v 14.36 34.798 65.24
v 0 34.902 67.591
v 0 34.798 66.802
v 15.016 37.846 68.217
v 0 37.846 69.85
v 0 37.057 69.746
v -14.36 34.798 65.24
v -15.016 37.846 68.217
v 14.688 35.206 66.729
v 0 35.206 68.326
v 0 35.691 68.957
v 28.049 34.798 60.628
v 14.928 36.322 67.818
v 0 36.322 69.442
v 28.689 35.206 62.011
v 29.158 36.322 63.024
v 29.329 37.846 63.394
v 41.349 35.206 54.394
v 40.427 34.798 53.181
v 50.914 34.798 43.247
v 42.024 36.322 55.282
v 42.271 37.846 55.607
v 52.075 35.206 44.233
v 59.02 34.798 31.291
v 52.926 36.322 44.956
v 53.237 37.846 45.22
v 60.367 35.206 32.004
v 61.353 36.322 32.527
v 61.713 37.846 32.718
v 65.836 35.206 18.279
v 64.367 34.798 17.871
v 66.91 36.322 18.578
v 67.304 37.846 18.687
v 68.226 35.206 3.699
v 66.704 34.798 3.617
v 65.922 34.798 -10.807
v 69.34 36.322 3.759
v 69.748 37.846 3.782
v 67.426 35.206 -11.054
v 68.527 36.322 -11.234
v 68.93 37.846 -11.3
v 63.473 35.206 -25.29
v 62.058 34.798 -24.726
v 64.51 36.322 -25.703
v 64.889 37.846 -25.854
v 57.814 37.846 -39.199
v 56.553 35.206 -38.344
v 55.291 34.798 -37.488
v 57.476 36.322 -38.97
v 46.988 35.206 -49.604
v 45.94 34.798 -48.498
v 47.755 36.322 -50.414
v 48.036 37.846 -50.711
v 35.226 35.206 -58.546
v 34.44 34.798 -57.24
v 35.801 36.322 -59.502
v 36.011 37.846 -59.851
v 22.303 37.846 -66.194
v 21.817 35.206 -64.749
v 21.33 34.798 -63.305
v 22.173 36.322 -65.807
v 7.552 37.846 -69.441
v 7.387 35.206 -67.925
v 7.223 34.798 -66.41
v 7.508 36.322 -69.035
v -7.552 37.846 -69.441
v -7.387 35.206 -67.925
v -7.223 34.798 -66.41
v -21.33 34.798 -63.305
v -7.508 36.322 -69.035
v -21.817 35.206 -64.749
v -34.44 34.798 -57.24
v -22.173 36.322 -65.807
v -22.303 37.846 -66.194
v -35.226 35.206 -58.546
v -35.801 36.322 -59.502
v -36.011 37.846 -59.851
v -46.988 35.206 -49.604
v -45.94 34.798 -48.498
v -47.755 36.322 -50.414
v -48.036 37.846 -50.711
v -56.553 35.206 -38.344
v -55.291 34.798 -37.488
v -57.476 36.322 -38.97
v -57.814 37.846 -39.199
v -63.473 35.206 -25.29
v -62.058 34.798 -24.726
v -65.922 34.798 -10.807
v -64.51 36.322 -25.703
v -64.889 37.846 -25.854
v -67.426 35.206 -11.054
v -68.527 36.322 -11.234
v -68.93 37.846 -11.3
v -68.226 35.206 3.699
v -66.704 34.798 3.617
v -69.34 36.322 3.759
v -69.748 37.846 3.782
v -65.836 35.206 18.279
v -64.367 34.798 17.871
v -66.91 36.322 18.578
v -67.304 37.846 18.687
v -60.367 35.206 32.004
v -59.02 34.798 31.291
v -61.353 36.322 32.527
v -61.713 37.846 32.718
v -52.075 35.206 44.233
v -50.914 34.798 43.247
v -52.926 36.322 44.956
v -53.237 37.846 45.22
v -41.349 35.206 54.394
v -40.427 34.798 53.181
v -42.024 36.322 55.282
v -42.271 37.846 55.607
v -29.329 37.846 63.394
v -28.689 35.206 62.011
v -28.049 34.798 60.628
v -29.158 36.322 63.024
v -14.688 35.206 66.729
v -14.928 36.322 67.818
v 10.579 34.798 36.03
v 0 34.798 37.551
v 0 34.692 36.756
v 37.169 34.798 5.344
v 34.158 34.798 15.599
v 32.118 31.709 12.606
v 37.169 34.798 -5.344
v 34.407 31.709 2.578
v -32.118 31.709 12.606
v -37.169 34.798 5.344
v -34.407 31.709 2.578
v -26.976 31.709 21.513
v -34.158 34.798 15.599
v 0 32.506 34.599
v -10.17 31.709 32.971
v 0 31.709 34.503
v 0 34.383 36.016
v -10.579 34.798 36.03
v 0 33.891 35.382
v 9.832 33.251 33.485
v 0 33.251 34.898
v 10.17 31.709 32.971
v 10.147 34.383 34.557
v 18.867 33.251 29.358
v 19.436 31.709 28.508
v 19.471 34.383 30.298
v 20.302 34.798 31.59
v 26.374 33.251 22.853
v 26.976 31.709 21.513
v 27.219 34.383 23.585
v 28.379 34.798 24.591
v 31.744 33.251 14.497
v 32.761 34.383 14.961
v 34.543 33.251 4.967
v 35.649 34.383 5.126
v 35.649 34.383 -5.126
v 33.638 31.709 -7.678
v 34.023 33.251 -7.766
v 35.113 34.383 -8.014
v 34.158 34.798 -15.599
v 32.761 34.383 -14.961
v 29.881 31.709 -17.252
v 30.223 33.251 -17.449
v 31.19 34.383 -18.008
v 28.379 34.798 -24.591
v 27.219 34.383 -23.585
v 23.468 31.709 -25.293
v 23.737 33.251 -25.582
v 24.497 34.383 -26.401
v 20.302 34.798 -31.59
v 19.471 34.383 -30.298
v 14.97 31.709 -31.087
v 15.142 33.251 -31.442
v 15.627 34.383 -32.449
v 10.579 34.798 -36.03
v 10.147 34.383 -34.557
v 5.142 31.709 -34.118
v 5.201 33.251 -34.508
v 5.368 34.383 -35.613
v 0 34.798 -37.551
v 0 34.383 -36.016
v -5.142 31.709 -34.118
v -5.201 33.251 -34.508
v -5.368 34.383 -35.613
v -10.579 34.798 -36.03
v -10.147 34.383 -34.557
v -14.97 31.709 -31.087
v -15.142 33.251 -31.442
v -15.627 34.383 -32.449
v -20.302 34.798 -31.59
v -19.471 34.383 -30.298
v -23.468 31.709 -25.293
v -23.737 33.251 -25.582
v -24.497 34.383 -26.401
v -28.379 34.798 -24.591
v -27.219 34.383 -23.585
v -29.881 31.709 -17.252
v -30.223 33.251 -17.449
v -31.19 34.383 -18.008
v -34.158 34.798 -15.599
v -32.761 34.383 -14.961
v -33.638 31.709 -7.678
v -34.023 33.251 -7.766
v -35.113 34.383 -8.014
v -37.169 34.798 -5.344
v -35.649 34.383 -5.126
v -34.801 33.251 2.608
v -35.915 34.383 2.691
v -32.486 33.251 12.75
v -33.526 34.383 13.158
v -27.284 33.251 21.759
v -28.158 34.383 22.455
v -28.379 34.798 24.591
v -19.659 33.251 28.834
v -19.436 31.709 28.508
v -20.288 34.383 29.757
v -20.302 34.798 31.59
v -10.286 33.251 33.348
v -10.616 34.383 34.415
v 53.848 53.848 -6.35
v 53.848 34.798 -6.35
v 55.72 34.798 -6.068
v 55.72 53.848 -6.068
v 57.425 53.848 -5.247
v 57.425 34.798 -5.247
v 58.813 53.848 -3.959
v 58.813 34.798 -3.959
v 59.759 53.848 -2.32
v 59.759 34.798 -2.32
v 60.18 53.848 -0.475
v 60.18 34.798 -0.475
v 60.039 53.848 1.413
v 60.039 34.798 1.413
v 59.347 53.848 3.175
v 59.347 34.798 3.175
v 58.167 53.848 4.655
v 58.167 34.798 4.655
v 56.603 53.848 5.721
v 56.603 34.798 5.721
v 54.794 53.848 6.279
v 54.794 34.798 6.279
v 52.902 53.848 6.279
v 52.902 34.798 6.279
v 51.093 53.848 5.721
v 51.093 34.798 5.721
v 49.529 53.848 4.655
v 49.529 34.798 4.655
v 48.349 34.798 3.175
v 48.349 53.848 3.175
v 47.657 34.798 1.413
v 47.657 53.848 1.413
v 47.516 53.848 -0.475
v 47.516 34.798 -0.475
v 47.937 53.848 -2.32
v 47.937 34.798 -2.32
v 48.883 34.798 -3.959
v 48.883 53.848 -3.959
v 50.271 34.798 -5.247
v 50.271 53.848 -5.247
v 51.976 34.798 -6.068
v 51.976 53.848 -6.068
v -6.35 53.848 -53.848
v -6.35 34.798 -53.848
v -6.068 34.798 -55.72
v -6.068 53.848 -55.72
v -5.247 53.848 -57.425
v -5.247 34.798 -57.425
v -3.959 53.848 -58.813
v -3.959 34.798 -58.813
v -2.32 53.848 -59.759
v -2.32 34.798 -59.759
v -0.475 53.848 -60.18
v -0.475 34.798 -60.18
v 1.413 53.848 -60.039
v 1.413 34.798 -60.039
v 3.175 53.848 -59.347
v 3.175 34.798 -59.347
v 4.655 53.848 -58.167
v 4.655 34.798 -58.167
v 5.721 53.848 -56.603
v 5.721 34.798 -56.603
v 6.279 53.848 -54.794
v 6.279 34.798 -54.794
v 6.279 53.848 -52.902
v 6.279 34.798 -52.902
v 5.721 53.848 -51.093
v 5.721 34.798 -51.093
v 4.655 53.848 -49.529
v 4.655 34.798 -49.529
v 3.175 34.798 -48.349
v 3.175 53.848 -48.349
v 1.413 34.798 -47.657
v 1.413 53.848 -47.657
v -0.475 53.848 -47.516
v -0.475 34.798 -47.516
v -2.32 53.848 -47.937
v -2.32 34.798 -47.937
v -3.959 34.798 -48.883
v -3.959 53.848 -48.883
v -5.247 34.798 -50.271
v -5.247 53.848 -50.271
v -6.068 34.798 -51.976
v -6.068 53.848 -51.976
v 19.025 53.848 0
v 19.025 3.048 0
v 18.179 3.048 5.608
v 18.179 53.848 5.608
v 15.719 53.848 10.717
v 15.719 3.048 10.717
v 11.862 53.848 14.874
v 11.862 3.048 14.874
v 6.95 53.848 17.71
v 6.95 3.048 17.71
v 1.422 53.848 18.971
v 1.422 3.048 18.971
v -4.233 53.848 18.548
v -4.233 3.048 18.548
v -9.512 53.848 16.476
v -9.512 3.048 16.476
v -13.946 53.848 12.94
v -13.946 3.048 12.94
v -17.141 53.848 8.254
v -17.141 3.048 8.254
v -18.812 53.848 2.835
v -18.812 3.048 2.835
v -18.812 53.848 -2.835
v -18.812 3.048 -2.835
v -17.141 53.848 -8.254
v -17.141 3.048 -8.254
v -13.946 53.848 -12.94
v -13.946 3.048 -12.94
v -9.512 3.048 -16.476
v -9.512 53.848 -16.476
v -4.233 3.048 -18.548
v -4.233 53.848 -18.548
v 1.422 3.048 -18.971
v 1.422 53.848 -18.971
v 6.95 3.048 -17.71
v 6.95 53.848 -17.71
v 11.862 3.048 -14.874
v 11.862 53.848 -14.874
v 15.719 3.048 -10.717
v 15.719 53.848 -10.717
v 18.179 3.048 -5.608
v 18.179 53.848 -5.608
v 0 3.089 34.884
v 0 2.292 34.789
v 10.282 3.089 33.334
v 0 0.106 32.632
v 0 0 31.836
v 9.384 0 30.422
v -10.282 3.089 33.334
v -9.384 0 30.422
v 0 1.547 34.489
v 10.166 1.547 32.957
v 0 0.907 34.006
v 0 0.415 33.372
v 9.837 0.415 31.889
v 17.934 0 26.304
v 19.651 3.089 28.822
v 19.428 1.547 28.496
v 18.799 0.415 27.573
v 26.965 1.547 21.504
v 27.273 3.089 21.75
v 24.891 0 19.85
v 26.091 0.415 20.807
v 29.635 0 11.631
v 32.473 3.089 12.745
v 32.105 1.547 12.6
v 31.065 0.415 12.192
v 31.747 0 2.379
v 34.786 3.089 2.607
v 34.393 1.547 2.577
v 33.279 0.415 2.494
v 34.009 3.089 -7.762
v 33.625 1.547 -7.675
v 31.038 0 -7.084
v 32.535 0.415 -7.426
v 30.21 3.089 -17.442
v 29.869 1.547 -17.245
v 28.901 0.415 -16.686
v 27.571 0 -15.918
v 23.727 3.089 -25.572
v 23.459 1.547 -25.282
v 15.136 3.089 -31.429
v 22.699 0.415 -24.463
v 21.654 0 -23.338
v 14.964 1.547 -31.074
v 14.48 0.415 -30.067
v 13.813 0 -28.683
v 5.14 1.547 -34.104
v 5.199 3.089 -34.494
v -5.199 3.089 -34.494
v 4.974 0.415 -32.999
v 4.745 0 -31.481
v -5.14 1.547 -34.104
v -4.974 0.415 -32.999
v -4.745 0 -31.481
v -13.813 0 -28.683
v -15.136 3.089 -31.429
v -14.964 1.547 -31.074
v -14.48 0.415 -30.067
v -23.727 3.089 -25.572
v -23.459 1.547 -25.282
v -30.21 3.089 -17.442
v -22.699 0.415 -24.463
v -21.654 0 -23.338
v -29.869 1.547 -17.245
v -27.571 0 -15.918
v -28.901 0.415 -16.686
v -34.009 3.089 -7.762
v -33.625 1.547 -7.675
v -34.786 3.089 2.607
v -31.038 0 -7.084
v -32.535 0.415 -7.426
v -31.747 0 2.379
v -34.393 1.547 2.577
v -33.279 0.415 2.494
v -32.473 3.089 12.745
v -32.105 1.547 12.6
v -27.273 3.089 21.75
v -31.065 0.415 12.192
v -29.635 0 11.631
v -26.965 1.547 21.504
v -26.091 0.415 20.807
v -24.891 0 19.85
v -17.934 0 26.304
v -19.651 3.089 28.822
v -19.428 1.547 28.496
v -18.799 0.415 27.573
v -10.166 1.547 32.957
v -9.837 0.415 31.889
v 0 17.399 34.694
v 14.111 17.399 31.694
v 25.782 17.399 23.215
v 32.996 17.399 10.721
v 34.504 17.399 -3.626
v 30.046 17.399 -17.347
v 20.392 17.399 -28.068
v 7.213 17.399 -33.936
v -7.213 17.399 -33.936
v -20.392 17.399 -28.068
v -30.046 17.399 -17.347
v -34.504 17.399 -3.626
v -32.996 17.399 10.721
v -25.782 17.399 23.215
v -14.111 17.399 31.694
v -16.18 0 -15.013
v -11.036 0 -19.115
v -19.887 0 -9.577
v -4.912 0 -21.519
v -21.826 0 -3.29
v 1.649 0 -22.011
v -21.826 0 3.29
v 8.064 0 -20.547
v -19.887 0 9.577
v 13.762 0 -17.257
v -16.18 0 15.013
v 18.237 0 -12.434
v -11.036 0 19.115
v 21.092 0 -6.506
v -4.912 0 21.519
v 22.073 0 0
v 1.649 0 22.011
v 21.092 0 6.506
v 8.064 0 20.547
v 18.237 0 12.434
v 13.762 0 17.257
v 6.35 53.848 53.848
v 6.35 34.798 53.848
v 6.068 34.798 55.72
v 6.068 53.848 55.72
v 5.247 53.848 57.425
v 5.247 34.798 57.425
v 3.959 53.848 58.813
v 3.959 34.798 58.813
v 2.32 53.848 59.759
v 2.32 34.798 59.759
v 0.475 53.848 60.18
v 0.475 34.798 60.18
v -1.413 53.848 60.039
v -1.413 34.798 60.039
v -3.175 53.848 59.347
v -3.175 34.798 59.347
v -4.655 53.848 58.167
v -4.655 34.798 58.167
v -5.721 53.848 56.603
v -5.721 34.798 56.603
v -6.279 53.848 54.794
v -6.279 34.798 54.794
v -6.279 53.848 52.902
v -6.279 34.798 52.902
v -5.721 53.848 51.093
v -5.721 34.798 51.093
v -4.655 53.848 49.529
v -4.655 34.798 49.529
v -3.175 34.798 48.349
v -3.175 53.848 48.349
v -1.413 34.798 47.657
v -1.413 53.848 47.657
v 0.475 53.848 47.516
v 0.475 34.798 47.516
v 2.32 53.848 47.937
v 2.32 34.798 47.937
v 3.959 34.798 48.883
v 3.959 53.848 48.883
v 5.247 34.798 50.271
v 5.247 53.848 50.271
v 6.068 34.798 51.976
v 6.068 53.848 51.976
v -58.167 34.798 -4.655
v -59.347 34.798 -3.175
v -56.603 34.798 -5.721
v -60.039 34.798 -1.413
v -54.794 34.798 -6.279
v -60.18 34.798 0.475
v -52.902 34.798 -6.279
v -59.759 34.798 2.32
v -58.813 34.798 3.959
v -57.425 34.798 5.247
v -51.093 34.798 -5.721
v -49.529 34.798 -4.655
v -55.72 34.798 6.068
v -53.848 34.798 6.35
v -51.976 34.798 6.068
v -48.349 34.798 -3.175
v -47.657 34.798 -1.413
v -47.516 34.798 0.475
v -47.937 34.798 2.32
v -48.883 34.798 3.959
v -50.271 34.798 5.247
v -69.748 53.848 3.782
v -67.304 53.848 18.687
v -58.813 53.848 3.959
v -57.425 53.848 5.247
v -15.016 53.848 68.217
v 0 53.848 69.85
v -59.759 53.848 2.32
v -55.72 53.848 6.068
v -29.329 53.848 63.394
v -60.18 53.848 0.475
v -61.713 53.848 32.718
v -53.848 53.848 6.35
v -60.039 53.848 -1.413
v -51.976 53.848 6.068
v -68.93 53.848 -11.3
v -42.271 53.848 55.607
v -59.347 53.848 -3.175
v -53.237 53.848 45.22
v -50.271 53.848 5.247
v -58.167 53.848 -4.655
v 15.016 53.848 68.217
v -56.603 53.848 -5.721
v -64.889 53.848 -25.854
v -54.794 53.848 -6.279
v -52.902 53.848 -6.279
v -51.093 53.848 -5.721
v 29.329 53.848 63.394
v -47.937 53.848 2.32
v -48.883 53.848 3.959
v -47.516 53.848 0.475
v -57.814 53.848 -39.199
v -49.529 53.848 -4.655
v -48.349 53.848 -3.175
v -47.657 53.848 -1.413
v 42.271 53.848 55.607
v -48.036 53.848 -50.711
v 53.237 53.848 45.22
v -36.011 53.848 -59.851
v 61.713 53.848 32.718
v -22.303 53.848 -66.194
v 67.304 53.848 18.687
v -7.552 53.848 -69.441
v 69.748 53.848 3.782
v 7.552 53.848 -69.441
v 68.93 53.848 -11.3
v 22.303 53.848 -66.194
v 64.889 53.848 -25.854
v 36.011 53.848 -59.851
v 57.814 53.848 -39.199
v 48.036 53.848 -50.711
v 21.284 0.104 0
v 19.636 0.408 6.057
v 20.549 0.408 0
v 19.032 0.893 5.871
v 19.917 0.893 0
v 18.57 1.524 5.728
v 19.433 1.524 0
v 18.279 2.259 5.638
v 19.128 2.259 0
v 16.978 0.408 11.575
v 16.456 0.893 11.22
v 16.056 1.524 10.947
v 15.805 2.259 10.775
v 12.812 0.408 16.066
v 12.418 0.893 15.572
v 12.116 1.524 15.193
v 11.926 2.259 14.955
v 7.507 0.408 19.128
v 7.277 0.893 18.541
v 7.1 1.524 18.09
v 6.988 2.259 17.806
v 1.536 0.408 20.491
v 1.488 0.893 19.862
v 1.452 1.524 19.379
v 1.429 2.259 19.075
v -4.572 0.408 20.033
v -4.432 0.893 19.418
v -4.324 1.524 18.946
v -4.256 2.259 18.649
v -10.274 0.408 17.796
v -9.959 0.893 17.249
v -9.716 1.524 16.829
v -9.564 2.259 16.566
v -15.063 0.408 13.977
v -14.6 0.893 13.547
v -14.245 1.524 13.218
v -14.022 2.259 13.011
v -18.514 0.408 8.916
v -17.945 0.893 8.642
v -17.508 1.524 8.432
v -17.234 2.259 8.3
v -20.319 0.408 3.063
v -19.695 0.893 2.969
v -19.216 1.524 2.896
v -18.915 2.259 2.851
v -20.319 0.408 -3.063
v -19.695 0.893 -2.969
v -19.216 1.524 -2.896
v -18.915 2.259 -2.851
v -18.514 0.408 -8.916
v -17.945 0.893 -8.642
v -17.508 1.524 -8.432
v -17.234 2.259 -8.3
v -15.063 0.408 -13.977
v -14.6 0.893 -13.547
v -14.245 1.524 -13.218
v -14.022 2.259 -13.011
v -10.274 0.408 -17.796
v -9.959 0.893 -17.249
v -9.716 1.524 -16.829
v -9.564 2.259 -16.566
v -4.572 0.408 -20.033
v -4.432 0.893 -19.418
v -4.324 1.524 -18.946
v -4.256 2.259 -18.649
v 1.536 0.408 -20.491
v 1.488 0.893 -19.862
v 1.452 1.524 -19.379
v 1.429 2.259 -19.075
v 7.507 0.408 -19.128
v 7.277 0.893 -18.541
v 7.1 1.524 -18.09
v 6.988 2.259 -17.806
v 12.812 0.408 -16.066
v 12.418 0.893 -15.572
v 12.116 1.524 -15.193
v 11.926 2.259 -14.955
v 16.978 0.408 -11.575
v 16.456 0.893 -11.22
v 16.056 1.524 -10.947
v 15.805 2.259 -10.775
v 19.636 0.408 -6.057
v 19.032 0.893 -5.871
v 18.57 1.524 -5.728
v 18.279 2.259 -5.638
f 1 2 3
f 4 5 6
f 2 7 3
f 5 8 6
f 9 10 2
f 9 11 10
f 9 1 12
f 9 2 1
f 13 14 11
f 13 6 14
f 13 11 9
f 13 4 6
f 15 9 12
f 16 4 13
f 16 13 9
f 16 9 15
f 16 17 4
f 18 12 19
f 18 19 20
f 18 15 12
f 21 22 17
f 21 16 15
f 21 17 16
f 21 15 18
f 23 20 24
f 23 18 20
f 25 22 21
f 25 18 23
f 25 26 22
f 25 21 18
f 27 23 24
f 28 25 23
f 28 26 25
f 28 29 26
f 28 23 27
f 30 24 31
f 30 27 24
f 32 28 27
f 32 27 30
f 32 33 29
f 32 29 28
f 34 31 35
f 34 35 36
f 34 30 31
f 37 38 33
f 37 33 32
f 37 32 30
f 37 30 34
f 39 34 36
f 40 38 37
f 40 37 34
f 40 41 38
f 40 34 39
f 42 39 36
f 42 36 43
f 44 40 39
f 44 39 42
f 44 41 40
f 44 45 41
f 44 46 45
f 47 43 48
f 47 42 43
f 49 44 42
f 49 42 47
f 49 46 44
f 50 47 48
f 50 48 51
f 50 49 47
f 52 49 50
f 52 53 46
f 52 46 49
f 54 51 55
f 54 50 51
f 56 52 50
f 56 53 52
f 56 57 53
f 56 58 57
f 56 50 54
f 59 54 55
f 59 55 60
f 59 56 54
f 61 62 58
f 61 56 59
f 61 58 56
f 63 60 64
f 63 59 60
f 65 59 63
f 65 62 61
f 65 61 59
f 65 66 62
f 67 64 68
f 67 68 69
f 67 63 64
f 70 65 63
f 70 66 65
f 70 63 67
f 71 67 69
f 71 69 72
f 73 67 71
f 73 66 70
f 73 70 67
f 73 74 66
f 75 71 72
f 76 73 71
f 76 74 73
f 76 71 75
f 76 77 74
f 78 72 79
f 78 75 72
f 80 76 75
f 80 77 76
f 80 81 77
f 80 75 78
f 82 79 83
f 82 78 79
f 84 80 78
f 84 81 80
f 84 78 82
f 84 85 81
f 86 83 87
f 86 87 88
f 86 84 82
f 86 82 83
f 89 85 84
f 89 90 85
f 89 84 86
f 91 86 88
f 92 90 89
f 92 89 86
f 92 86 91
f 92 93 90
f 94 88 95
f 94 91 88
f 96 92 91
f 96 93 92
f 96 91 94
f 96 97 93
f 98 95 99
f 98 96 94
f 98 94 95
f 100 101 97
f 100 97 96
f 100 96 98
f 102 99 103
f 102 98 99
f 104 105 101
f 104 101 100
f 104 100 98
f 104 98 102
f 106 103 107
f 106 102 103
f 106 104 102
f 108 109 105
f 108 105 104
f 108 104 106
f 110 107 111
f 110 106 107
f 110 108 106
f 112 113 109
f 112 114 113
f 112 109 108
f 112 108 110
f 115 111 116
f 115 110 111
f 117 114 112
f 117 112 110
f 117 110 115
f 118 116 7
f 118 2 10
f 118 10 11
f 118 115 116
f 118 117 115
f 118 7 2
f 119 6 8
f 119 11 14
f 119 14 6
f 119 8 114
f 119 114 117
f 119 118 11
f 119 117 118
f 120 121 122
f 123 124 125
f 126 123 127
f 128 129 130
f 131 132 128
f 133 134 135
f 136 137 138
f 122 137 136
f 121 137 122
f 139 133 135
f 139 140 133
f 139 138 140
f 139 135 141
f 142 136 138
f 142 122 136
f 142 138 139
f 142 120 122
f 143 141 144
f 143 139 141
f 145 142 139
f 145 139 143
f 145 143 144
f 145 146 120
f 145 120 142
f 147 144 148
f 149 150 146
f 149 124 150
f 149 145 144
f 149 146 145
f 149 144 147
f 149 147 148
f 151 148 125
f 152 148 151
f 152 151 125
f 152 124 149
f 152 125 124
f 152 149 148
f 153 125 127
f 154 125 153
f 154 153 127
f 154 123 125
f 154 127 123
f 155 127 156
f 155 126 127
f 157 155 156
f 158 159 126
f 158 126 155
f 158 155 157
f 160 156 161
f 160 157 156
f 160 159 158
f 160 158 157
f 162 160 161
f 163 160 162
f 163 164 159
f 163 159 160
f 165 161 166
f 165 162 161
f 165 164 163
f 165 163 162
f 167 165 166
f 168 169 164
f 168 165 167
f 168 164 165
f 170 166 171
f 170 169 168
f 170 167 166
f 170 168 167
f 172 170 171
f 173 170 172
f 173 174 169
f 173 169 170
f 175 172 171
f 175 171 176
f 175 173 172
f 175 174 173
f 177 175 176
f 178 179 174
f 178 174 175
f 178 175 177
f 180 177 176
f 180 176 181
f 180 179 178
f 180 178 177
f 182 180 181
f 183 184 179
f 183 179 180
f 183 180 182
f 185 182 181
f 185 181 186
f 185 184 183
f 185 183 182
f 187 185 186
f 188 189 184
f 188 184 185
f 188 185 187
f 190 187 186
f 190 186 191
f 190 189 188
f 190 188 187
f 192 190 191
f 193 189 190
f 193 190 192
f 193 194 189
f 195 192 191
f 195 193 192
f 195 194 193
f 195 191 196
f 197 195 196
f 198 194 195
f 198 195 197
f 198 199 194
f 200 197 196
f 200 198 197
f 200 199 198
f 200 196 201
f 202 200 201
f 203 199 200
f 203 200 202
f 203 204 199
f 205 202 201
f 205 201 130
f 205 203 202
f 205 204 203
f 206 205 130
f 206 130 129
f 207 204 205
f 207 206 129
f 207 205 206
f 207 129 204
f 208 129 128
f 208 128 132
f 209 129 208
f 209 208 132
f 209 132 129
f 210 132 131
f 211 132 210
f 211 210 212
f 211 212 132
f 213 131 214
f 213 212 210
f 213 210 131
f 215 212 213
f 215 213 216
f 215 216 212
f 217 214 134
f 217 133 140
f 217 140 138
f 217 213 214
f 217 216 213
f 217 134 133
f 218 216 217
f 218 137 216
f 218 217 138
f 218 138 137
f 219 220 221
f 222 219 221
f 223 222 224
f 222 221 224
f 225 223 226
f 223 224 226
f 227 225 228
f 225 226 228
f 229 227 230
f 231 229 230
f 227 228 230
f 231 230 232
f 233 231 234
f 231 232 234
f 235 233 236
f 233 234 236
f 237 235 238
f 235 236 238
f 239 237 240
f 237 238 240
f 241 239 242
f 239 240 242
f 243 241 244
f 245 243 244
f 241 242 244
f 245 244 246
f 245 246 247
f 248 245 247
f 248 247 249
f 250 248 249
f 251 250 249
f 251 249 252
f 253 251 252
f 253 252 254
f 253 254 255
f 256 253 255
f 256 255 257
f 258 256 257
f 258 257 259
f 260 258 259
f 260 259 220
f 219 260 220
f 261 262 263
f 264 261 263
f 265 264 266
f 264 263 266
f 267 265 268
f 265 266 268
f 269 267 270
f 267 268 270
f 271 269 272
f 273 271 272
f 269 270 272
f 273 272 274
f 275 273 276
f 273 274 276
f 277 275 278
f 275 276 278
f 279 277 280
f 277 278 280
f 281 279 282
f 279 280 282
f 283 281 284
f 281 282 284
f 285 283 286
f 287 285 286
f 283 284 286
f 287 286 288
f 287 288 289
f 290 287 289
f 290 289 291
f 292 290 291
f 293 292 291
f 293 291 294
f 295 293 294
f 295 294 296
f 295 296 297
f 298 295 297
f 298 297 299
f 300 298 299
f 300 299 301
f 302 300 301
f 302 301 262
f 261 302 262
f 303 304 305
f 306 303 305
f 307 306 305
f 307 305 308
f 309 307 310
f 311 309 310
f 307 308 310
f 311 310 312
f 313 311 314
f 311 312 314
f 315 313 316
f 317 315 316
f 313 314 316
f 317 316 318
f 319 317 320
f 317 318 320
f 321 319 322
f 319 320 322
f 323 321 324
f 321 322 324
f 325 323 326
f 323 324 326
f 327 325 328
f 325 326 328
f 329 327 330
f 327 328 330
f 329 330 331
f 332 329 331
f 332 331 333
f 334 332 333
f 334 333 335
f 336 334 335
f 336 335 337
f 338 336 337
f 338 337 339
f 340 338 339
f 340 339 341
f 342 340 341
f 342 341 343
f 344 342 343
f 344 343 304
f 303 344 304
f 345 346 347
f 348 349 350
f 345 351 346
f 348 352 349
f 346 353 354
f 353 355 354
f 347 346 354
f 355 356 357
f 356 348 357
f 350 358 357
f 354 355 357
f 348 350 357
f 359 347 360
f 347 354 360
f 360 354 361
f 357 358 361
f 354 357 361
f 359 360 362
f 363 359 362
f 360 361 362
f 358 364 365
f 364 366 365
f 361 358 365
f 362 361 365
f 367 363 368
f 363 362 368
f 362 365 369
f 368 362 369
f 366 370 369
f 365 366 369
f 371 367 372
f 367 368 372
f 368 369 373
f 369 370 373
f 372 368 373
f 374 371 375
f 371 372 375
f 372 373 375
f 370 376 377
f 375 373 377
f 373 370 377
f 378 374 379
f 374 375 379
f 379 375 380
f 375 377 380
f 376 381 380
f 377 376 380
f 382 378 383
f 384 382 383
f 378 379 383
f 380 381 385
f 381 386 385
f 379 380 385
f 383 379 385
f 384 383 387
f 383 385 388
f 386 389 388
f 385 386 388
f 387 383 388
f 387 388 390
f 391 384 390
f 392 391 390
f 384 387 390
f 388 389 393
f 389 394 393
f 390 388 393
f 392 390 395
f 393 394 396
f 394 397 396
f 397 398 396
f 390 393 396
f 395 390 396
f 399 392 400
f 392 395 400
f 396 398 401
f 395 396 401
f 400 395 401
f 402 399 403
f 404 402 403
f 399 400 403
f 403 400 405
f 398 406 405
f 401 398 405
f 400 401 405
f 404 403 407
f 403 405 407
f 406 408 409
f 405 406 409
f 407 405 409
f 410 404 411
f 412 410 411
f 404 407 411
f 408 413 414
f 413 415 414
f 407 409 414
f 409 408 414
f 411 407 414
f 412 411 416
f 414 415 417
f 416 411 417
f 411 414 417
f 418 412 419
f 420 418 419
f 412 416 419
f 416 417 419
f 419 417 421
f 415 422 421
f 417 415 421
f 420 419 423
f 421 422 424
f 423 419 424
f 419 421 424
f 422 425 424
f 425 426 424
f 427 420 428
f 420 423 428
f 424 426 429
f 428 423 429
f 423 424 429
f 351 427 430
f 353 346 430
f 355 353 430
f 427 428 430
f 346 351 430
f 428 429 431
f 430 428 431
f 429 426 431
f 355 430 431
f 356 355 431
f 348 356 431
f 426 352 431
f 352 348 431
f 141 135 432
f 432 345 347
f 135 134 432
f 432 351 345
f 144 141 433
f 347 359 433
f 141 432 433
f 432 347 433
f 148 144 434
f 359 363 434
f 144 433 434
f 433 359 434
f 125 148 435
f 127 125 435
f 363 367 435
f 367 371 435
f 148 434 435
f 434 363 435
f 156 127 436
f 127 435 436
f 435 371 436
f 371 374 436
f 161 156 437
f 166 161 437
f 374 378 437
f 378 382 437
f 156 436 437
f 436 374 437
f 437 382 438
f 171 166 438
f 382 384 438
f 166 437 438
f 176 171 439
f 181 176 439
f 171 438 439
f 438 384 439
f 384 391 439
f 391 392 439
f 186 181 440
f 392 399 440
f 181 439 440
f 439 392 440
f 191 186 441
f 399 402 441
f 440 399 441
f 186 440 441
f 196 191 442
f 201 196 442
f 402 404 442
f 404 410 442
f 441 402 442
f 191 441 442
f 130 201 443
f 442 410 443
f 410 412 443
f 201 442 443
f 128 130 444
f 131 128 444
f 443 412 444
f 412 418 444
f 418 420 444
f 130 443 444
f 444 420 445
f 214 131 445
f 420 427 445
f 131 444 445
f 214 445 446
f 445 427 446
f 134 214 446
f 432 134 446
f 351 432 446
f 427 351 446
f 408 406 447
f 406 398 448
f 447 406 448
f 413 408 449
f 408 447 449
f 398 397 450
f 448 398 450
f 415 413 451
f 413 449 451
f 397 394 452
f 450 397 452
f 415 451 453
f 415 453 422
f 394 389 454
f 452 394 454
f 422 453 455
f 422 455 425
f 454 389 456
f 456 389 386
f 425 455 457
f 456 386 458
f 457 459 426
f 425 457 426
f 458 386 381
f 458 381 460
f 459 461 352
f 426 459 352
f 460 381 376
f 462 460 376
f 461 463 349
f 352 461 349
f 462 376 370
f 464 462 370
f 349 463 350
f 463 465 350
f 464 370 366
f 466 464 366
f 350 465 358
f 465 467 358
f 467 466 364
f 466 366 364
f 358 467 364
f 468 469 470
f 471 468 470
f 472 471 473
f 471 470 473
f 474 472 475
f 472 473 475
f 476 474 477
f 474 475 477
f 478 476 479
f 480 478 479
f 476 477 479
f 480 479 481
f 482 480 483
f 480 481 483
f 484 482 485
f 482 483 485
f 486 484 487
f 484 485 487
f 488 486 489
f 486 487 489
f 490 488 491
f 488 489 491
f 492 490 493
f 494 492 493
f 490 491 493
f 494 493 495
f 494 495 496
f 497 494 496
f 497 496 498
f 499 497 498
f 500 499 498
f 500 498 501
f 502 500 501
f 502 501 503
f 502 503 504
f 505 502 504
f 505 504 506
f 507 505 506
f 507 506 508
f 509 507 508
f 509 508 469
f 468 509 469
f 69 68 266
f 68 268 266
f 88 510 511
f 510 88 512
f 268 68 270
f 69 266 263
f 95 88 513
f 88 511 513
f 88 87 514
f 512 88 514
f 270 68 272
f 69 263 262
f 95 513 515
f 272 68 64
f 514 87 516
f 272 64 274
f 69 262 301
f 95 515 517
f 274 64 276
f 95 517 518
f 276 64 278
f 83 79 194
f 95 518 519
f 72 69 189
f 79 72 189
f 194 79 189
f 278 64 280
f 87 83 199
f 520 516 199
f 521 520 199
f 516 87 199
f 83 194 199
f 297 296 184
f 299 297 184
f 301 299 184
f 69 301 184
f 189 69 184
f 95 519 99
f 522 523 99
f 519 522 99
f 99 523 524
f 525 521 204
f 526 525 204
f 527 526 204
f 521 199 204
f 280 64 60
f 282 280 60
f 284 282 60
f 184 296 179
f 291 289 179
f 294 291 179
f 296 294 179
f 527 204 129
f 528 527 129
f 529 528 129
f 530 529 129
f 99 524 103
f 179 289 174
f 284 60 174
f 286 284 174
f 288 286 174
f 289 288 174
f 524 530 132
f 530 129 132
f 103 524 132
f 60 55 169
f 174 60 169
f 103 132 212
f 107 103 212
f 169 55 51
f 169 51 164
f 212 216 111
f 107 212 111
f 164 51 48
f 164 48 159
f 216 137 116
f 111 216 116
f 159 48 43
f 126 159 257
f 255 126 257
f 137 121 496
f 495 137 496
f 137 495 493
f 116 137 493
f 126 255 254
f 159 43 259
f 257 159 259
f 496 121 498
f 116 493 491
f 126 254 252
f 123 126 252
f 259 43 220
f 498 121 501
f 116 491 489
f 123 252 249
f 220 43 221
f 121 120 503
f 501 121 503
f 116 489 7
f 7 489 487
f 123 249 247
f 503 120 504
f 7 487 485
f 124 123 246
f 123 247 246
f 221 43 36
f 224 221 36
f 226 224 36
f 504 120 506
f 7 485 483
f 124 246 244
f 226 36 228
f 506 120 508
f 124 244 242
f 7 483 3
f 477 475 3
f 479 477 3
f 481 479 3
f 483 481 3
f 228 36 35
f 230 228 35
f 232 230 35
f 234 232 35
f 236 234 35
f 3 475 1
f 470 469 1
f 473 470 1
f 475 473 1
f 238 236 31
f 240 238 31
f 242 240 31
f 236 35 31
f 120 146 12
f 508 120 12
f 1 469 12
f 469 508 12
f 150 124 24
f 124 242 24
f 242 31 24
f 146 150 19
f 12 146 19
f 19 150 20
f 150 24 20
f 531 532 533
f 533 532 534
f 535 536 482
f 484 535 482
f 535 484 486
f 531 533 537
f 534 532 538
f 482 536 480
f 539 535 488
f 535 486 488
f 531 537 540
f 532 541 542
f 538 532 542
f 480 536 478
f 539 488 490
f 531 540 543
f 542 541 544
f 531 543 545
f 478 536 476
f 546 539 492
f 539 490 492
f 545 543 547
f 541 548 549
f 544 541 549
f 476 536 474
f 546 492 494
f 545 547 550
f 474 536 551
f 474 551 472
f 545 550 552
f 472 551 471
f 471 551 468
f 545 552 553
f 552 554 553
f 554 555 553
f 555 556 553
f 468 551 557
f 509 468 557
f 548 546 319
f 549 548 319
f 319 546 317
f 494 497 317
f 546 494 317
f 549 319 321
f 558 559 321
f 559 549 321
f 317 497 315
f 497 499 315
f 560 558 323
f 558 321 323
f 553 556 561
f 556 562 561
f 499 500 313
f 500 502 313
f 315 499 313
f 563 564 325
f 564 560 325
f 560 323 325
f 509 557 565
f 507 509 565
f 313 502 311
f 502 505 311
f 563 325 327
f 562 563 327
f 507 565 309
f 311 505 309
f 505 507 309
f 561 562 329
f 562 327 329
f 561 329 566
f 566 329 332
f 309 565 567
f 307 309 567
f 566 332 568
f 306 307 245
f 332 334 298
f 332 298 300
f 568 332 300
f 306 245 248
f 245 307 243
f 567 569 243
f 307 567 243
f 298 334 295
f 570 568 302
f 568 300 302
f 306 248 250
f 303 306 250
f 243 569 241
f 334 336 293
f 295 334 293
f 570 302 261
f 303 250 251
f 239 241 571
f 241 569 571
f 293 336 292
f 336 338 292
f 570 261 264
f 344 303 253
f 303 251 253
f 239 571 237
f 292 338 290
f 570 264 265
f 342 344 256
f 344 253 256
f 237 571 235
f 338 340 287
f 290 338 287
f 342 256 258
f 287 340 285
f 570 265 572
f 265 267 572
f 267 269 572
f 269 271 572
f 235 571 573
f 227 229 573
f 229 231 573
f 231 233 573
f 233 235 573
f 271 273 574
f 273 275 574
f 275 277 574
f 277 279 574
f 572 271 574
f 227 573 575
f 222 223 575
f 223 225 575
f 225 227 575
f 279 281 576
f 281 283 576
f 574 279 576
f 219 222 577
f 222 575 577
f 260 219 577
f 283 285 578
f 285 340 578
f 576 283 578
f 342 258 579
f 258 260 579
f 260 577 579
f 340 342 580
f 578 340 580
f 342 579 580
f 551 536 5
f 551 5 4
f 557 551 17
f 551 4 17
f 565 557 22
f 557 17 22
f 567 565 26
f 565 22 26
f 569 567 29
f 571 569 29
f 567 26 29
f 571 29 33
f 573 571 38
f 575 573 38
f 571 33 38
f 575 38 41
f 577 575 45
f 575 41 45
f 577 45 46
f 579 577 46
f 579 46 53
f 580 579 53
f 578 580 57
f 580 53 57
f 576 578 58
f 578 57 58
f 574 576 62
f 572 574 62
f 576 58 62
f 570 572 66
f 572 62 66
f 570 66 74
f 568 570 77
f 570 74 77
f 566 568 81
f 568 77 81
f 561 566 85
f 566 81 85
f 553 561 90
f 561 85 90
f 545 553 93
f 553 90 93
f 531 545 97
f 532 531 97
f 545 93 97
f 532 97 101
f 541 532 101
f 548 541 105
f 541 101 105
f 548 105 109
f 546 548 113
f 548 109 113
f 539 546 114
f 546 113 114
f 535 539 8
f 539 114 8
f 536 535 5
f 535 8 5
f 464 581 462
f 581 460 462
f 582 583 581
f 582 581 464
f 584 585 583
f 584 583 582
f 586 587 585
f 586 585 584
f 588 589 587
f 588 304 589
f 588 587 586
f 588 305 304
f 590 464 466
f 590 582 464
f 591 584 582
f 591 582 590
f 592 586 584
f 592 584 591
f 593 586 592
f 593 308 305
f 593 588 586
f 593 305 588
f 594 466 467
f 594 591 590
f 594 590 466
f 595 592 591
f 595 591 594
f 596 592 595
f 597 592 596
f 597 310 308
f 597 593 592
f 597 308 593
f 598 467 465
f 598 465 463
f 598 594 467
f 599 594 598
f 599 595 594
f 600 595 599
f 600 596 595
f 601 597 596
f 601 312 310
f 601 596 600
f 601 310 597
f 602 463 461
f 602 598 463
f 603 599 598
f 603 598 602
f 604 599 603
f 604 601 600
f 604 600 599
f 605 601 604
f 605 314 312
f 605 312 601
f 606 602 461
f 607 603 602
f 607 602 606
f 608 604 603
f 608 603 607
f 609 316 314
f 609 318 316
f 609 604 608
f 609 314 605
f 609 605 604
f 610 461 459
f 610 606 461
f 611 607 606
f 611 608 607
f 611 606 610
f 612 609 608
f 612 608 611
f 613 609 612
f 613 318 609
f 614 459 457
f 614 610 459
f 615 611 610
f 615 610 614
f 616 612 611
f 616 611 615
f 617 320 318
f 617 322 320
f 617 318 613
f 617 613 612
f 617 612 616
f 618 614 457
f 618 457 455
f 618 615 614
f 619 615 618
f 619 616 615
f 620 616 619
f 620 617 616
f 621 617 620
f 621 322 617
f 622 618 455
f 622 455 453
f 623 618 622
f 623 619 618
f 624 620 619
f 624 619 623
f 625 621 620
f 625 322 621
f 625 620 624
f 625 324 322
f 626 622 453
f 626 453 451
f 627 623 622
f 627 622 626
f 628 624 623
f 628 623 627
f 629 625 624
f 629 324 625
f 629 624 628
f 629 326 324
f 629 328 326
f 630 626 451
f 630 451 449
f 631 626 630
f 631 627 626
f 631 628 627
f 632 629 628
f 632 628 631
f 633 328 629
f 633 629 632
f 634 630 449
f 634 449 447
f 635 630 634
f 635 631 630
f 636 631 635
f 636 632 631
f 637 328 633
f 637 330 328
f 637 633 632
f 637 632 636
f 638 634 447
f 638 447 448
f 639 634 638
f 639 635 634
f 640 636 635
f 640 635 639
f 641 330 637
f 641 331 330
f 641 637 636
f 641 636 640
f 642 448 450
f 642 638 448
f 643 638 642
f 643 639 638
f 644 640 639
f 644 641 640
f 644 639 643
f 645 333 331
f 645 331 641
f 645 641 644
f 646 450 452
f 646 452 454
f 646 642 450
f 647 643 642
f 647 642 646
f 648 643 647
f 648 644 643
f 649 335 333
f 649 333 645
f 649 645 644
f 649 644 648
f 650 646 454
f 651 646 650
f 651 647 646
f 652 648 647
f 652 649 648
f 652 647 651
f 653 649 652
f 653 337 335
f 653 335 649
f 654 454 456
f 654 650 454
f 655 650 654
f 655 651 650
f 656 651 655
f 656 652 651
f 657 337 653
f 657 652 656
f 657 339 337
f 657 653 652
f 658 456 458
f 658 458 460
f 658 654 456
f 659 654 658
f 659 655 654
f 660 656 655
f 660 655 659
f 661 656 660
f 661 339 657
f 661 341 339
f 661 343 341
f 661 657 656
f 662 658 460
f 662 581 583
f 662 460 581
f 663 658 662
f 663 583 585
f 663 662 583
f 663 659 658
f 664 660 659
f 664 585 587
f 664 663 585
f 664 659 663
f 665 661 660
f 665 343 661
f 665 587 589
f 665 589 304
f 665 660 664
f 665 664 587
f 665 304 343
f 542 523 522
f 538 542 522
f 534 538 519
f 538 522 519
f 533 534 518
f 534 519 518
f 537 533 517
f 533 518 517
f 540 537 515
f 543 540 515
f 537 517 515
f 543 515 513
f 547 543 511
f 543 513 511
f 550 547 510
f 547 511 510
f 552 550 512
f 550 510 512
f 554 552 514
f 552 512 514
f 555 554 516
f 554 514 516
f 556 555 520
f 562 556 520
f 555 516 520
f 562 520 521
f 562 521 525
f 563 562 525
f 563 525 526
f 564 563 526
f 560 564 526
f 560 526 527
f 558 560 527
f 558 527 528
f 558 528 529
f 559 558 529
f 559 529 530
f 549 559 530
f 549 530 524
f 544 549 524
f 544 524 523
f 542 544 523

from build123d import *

# Parameters (mm, degrees)
F2_R            = 19.0246
F3_DEPTH        = 53.849
F4_R            = 6.35
F5_DEPTH        = 53.849
F5_COPIES_COUNT = 4
F6_R            = 3.048


# Not quite as in the source:
# - a pattern or mirror of a feature is missing from the dataset's text; its kind, count and spacing are read off the source's solid


with BuildPart() as f1:
    # F0 (on Right) → F1 (revolve)
    with BuildSketch(Plane.YZ):
        Polygon((34.798, 34.4624179433), (0, 34.925), (0, 0), (53.848, 0), (53.848, 69.85), (34.798, 69.85), align=None)
    revolve(axis=Axis((0, 26.924, 0), (0, 1, 0)))

    # F2 (on Front) → F3 (cut, through all)
    with BuildSketch(Plane.XZ):
        Circle(F2_R)
    extrude(amount=-F3_DEPTH, mode=Mode.SUBTRACT)

    # F4 (on Front) → F5 (cut, through all)
    with BuildSketch(Plane.XZ):
        with Locations((0, 53.848)):
            Circle(F4_R)
    f5 = extrude(amount=-F5_DEPTH, mode=Mode.SUBTRACT)

    # F5_copies: F5 ×4 about axis
    f5_copies_axis = Axis((0, 0, 0), (0, 1, 0))
    for i in range(1, F5_COPIES_COUNT):
        add(f5.rotate(f5_copies_axis, i * 360 / F5_COPIES_COUNT), mode=Mode.SUBTRACT)

    # F6
    f6_edges = [f1.edges().sort_by_distance(p)[0] for p in [
        (0, 0, -34.925),
        (-19.0246, 0, 0),
        (0, 34.798, -69.85),
        (0, 34.798, -34.462418),
    ]]
    fillet(f6_edges, radius=F6_R)


solid = f1.part
